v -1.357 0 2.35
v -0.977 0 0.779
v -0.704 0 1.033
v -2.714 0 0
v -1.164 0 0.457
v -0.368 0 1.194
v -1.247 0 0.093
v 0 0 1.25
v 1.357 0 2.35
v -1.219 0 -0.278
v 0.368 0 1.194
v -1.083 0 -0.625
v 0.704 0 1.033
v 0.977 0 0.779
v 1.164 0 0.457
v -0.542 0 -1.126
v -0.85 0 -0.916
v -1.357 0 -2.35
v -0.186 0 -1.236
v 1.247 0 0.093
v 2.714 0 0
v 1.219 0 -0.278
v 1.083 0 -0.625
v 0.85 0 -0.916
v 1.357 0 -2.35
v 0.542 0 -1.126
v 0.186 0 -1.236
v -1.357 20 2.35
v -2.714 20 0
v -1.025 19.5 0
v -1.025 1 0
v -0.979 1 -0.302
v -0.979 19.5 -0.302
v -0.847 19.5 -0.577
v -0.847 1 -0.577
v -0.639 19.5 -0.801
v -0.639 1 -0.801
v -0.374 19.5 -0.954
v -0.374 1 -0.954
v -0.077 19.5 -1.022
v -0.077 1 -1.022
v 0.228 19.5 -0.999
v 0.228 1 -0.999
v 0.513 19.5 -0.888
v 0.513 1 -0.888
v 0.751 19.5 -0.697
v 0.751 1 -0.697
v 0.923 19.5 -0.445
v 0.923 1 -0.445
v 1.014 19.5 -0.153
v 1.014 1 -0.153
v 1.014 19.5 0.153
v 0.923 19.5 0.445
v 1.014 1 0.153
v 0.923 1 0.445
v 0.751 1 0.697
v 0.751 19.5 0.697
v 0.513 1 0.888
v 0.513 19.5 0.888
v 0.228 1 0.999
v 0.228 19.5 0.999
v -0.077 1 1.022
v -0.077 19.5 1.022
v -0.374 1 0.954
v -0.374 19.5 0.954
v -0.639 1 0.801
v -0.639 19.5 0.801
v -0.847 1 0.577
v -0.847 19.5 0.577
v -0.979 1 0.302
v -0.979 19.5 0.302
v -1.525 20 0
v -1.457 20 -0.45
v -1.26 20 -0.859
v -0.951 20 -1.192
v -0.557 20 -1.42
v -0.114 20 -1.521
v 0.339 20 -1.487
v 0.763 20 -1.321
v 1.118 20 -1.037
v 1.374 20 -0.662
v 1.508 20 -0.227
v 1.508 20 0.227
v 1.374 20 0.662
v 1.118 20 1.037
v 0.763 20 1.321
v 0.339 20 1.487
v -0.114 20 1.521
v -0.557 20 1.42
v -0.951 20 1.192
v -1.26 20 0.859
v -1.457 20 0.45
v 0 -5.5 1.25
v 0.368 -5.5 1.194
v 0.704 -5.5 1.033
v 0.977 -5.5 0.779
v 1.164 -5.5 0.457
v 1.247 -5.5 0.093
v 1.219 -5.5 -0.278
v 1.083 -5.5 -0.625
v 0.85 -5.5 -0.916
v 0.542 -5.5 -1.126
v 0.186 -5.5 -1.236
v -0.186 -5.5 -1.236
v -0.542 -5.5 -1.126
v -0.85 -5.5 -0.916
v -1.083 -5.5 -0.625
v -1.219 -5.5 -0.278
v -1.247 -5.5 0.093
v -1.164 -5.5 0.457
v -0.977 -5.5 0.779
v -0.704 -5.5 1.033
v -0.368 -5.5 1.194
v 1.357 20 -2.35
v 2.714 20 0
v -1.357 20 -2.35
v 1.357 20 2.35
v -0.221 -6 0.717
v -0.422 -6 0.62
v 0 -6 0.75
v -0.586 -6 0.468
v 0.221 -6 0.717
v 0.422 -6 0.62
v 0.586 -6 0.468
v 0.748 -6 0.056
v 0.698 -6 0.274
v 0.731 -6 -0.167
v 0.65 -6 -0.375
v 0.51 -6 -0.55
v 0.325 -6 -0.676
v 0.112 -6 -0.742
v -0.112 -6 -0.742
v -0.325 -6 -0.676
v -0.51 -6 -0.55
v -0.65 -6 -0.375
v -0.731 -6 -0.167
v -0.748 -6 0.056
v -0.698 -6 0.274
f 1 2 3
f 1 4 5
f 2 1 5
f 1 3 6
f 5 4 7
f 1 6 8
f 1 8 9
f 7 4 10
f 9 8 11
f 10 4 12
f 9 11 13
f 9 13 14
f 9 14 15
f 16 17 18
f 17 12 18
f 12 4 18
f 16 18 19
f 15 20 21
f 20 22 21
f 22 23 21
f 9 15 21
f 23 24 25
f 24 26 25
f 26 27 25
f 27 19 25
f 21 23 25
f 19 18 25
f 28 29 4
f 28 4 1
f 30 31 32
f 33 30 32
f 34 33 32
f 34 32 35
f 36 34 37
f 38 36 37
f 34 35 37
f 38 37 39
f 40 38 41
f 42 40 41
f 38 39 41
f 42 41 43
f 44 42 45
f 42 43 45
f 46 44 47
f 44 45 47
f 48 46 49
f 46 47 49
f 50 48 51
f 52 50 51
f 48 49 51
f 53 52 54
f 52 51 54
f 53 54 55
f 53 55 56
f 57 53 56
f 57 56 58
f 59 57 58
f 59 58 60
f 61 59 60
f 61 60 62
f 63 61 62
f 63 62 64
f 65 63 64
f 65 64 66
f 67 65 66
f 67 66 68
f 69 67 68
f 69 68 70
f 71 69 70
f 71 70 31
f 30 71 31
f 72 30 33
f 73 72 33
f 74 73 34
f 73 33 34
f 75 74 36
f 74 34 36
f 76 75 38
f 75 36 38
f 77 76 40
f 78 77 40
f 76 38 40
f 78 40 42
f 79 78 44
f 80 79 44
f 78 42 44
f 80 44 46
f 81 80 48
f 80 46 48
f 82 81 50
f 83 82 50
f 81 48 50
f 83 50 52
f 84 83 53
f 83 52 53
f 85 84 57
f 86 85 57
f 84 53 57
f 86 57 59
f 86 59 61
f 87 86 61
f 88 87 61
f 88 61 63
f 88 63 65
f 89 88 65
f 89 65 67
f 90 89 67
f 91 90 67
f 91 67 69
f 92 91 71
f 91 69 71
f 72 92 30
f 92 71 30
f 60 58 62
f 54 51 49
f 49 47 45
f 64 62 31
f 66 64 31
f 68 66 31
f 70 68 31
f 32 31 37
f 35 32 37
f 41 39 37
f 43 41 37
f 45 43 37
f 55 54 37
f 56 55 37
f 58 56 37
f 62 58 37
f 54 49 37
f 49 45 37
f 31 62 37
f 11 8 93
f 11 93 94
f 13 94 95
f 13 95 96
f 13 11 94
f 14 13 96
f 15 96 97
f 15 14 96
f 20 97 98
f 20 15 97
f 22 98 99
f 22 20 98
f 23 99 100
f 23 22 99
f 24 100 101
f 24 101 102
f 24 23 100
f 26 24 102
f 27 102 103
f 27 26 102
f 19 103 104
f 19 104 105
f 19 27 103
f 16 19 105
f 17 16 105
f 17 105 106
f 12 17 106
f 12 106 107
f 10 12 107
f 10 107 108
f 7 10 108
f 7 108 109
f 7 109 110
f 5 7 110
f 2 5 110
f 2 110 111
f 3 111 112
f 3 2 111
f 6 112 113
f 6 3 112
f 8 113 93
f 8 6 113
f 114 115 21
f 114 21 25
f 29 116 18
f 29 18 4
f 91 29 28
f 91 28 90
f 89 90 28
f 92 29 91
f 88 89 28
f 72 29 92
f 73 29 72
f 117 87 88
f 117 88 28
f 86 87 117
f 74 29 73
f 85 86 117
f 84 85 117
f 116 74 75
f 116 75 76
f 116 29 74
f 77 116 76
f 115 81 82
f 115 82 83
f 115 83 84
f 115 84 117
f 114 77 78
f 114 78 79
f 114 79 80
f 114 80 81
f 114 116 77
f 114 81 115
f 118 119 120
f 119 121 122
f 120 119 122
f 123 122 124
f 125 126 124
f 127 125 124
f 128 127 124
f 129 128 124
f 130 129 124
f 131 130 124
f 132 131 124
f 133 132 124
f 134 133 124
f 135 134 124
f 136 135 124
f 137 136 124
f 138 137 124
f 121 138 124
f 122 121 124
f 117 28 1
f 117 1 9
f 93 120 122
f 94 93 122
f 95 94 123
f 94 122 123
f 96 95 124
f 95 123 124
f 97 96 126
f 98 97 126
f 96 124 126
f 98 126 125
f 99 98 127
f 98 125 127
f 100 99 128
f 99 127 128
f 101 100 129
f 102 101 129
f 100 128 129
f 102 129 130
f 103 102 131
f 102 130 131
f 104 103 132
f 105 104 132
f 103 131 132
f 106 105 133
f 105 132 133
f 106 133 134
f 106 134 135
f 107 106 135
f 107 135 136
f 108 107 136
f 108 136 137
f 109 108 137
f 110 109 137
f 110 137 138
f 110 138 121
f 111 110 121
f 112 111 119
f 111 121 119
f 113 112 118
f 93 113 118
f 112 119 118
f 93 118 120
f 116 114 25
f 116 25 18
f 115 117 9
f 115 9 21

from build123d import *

# Parameters (mm, degrees)
BOSS_EXTRUDE1_DEPTH                = 20
SKETCH2_W                          = 1.25
SKETCH2_H                          = 6
TAP_DRILL_FOR_M2_5X0_45_TAP1_D     = 2.05
TAP_DRILL_FOR_M2_5X0_45_TAP1_DEPTH = 19
CHAMFER1_SIZE                      = 0.5


with BuildPart() as part:
    # Sketch1 → Boss-Extrude1 (new body)
    with BuildSketch(Plane(origin=(0, 20, 0), x_dir=(1, 0, 0), z_dir=(0, 1, 0))):
        Polygon((1.356773133, -2.35), (2.713546265, 0), (1.356773133, 2.35), (-1.356773133, 2.35), (-2.713546265, 0), (-1.356773133, -2.35), align=None)
    extrude(amount=-BOSS_EXTRUDE1_DEPTH)

    # Sketch2 → Revolve1 (revolve)
    with BuildSketch(Plane(origin=(0, 0, 0), x_dir=(-1, 0, 0), z_dir=(0, 0, -1)), mode=Mode.PRIVATE) as revolve1_sk:
        with Locations((-0.625, -3)):
            Rectangle(SKETCH2_W, SKETCH2_H)
    revolve(revolve1_sk.sketch.rotate(Axis((0, -6, 0), (0, 1, 0)), 270), axis=Axis((0, -6, 0), (0, 1, 0)))

    # Tap Drill for M2.5x0.45 Tap1
    with Locations(Plane(origin=(0, 20, 0), x_dir=(1, 0, 0), z_dir=(0, 1, 0))):
        with Locations((0, 0)):
            Hole(TAP_DRILL_FOR_M2_5X0_45_TAP1_D / 2, depth=TAP_DRILL_FOR_M2_5X0_45_TAP1_DEPTH)

    # Chamfer1
    chamfer1_edges = [part.edges().sort_by_distance(p)[0] for p in [
        (0, -6, -1.25),
        (1.025, 20, 0),
    ]]
    chamfer(chamfer1_edges, length=CHAMFER1_SIZE)


solid = part.part
